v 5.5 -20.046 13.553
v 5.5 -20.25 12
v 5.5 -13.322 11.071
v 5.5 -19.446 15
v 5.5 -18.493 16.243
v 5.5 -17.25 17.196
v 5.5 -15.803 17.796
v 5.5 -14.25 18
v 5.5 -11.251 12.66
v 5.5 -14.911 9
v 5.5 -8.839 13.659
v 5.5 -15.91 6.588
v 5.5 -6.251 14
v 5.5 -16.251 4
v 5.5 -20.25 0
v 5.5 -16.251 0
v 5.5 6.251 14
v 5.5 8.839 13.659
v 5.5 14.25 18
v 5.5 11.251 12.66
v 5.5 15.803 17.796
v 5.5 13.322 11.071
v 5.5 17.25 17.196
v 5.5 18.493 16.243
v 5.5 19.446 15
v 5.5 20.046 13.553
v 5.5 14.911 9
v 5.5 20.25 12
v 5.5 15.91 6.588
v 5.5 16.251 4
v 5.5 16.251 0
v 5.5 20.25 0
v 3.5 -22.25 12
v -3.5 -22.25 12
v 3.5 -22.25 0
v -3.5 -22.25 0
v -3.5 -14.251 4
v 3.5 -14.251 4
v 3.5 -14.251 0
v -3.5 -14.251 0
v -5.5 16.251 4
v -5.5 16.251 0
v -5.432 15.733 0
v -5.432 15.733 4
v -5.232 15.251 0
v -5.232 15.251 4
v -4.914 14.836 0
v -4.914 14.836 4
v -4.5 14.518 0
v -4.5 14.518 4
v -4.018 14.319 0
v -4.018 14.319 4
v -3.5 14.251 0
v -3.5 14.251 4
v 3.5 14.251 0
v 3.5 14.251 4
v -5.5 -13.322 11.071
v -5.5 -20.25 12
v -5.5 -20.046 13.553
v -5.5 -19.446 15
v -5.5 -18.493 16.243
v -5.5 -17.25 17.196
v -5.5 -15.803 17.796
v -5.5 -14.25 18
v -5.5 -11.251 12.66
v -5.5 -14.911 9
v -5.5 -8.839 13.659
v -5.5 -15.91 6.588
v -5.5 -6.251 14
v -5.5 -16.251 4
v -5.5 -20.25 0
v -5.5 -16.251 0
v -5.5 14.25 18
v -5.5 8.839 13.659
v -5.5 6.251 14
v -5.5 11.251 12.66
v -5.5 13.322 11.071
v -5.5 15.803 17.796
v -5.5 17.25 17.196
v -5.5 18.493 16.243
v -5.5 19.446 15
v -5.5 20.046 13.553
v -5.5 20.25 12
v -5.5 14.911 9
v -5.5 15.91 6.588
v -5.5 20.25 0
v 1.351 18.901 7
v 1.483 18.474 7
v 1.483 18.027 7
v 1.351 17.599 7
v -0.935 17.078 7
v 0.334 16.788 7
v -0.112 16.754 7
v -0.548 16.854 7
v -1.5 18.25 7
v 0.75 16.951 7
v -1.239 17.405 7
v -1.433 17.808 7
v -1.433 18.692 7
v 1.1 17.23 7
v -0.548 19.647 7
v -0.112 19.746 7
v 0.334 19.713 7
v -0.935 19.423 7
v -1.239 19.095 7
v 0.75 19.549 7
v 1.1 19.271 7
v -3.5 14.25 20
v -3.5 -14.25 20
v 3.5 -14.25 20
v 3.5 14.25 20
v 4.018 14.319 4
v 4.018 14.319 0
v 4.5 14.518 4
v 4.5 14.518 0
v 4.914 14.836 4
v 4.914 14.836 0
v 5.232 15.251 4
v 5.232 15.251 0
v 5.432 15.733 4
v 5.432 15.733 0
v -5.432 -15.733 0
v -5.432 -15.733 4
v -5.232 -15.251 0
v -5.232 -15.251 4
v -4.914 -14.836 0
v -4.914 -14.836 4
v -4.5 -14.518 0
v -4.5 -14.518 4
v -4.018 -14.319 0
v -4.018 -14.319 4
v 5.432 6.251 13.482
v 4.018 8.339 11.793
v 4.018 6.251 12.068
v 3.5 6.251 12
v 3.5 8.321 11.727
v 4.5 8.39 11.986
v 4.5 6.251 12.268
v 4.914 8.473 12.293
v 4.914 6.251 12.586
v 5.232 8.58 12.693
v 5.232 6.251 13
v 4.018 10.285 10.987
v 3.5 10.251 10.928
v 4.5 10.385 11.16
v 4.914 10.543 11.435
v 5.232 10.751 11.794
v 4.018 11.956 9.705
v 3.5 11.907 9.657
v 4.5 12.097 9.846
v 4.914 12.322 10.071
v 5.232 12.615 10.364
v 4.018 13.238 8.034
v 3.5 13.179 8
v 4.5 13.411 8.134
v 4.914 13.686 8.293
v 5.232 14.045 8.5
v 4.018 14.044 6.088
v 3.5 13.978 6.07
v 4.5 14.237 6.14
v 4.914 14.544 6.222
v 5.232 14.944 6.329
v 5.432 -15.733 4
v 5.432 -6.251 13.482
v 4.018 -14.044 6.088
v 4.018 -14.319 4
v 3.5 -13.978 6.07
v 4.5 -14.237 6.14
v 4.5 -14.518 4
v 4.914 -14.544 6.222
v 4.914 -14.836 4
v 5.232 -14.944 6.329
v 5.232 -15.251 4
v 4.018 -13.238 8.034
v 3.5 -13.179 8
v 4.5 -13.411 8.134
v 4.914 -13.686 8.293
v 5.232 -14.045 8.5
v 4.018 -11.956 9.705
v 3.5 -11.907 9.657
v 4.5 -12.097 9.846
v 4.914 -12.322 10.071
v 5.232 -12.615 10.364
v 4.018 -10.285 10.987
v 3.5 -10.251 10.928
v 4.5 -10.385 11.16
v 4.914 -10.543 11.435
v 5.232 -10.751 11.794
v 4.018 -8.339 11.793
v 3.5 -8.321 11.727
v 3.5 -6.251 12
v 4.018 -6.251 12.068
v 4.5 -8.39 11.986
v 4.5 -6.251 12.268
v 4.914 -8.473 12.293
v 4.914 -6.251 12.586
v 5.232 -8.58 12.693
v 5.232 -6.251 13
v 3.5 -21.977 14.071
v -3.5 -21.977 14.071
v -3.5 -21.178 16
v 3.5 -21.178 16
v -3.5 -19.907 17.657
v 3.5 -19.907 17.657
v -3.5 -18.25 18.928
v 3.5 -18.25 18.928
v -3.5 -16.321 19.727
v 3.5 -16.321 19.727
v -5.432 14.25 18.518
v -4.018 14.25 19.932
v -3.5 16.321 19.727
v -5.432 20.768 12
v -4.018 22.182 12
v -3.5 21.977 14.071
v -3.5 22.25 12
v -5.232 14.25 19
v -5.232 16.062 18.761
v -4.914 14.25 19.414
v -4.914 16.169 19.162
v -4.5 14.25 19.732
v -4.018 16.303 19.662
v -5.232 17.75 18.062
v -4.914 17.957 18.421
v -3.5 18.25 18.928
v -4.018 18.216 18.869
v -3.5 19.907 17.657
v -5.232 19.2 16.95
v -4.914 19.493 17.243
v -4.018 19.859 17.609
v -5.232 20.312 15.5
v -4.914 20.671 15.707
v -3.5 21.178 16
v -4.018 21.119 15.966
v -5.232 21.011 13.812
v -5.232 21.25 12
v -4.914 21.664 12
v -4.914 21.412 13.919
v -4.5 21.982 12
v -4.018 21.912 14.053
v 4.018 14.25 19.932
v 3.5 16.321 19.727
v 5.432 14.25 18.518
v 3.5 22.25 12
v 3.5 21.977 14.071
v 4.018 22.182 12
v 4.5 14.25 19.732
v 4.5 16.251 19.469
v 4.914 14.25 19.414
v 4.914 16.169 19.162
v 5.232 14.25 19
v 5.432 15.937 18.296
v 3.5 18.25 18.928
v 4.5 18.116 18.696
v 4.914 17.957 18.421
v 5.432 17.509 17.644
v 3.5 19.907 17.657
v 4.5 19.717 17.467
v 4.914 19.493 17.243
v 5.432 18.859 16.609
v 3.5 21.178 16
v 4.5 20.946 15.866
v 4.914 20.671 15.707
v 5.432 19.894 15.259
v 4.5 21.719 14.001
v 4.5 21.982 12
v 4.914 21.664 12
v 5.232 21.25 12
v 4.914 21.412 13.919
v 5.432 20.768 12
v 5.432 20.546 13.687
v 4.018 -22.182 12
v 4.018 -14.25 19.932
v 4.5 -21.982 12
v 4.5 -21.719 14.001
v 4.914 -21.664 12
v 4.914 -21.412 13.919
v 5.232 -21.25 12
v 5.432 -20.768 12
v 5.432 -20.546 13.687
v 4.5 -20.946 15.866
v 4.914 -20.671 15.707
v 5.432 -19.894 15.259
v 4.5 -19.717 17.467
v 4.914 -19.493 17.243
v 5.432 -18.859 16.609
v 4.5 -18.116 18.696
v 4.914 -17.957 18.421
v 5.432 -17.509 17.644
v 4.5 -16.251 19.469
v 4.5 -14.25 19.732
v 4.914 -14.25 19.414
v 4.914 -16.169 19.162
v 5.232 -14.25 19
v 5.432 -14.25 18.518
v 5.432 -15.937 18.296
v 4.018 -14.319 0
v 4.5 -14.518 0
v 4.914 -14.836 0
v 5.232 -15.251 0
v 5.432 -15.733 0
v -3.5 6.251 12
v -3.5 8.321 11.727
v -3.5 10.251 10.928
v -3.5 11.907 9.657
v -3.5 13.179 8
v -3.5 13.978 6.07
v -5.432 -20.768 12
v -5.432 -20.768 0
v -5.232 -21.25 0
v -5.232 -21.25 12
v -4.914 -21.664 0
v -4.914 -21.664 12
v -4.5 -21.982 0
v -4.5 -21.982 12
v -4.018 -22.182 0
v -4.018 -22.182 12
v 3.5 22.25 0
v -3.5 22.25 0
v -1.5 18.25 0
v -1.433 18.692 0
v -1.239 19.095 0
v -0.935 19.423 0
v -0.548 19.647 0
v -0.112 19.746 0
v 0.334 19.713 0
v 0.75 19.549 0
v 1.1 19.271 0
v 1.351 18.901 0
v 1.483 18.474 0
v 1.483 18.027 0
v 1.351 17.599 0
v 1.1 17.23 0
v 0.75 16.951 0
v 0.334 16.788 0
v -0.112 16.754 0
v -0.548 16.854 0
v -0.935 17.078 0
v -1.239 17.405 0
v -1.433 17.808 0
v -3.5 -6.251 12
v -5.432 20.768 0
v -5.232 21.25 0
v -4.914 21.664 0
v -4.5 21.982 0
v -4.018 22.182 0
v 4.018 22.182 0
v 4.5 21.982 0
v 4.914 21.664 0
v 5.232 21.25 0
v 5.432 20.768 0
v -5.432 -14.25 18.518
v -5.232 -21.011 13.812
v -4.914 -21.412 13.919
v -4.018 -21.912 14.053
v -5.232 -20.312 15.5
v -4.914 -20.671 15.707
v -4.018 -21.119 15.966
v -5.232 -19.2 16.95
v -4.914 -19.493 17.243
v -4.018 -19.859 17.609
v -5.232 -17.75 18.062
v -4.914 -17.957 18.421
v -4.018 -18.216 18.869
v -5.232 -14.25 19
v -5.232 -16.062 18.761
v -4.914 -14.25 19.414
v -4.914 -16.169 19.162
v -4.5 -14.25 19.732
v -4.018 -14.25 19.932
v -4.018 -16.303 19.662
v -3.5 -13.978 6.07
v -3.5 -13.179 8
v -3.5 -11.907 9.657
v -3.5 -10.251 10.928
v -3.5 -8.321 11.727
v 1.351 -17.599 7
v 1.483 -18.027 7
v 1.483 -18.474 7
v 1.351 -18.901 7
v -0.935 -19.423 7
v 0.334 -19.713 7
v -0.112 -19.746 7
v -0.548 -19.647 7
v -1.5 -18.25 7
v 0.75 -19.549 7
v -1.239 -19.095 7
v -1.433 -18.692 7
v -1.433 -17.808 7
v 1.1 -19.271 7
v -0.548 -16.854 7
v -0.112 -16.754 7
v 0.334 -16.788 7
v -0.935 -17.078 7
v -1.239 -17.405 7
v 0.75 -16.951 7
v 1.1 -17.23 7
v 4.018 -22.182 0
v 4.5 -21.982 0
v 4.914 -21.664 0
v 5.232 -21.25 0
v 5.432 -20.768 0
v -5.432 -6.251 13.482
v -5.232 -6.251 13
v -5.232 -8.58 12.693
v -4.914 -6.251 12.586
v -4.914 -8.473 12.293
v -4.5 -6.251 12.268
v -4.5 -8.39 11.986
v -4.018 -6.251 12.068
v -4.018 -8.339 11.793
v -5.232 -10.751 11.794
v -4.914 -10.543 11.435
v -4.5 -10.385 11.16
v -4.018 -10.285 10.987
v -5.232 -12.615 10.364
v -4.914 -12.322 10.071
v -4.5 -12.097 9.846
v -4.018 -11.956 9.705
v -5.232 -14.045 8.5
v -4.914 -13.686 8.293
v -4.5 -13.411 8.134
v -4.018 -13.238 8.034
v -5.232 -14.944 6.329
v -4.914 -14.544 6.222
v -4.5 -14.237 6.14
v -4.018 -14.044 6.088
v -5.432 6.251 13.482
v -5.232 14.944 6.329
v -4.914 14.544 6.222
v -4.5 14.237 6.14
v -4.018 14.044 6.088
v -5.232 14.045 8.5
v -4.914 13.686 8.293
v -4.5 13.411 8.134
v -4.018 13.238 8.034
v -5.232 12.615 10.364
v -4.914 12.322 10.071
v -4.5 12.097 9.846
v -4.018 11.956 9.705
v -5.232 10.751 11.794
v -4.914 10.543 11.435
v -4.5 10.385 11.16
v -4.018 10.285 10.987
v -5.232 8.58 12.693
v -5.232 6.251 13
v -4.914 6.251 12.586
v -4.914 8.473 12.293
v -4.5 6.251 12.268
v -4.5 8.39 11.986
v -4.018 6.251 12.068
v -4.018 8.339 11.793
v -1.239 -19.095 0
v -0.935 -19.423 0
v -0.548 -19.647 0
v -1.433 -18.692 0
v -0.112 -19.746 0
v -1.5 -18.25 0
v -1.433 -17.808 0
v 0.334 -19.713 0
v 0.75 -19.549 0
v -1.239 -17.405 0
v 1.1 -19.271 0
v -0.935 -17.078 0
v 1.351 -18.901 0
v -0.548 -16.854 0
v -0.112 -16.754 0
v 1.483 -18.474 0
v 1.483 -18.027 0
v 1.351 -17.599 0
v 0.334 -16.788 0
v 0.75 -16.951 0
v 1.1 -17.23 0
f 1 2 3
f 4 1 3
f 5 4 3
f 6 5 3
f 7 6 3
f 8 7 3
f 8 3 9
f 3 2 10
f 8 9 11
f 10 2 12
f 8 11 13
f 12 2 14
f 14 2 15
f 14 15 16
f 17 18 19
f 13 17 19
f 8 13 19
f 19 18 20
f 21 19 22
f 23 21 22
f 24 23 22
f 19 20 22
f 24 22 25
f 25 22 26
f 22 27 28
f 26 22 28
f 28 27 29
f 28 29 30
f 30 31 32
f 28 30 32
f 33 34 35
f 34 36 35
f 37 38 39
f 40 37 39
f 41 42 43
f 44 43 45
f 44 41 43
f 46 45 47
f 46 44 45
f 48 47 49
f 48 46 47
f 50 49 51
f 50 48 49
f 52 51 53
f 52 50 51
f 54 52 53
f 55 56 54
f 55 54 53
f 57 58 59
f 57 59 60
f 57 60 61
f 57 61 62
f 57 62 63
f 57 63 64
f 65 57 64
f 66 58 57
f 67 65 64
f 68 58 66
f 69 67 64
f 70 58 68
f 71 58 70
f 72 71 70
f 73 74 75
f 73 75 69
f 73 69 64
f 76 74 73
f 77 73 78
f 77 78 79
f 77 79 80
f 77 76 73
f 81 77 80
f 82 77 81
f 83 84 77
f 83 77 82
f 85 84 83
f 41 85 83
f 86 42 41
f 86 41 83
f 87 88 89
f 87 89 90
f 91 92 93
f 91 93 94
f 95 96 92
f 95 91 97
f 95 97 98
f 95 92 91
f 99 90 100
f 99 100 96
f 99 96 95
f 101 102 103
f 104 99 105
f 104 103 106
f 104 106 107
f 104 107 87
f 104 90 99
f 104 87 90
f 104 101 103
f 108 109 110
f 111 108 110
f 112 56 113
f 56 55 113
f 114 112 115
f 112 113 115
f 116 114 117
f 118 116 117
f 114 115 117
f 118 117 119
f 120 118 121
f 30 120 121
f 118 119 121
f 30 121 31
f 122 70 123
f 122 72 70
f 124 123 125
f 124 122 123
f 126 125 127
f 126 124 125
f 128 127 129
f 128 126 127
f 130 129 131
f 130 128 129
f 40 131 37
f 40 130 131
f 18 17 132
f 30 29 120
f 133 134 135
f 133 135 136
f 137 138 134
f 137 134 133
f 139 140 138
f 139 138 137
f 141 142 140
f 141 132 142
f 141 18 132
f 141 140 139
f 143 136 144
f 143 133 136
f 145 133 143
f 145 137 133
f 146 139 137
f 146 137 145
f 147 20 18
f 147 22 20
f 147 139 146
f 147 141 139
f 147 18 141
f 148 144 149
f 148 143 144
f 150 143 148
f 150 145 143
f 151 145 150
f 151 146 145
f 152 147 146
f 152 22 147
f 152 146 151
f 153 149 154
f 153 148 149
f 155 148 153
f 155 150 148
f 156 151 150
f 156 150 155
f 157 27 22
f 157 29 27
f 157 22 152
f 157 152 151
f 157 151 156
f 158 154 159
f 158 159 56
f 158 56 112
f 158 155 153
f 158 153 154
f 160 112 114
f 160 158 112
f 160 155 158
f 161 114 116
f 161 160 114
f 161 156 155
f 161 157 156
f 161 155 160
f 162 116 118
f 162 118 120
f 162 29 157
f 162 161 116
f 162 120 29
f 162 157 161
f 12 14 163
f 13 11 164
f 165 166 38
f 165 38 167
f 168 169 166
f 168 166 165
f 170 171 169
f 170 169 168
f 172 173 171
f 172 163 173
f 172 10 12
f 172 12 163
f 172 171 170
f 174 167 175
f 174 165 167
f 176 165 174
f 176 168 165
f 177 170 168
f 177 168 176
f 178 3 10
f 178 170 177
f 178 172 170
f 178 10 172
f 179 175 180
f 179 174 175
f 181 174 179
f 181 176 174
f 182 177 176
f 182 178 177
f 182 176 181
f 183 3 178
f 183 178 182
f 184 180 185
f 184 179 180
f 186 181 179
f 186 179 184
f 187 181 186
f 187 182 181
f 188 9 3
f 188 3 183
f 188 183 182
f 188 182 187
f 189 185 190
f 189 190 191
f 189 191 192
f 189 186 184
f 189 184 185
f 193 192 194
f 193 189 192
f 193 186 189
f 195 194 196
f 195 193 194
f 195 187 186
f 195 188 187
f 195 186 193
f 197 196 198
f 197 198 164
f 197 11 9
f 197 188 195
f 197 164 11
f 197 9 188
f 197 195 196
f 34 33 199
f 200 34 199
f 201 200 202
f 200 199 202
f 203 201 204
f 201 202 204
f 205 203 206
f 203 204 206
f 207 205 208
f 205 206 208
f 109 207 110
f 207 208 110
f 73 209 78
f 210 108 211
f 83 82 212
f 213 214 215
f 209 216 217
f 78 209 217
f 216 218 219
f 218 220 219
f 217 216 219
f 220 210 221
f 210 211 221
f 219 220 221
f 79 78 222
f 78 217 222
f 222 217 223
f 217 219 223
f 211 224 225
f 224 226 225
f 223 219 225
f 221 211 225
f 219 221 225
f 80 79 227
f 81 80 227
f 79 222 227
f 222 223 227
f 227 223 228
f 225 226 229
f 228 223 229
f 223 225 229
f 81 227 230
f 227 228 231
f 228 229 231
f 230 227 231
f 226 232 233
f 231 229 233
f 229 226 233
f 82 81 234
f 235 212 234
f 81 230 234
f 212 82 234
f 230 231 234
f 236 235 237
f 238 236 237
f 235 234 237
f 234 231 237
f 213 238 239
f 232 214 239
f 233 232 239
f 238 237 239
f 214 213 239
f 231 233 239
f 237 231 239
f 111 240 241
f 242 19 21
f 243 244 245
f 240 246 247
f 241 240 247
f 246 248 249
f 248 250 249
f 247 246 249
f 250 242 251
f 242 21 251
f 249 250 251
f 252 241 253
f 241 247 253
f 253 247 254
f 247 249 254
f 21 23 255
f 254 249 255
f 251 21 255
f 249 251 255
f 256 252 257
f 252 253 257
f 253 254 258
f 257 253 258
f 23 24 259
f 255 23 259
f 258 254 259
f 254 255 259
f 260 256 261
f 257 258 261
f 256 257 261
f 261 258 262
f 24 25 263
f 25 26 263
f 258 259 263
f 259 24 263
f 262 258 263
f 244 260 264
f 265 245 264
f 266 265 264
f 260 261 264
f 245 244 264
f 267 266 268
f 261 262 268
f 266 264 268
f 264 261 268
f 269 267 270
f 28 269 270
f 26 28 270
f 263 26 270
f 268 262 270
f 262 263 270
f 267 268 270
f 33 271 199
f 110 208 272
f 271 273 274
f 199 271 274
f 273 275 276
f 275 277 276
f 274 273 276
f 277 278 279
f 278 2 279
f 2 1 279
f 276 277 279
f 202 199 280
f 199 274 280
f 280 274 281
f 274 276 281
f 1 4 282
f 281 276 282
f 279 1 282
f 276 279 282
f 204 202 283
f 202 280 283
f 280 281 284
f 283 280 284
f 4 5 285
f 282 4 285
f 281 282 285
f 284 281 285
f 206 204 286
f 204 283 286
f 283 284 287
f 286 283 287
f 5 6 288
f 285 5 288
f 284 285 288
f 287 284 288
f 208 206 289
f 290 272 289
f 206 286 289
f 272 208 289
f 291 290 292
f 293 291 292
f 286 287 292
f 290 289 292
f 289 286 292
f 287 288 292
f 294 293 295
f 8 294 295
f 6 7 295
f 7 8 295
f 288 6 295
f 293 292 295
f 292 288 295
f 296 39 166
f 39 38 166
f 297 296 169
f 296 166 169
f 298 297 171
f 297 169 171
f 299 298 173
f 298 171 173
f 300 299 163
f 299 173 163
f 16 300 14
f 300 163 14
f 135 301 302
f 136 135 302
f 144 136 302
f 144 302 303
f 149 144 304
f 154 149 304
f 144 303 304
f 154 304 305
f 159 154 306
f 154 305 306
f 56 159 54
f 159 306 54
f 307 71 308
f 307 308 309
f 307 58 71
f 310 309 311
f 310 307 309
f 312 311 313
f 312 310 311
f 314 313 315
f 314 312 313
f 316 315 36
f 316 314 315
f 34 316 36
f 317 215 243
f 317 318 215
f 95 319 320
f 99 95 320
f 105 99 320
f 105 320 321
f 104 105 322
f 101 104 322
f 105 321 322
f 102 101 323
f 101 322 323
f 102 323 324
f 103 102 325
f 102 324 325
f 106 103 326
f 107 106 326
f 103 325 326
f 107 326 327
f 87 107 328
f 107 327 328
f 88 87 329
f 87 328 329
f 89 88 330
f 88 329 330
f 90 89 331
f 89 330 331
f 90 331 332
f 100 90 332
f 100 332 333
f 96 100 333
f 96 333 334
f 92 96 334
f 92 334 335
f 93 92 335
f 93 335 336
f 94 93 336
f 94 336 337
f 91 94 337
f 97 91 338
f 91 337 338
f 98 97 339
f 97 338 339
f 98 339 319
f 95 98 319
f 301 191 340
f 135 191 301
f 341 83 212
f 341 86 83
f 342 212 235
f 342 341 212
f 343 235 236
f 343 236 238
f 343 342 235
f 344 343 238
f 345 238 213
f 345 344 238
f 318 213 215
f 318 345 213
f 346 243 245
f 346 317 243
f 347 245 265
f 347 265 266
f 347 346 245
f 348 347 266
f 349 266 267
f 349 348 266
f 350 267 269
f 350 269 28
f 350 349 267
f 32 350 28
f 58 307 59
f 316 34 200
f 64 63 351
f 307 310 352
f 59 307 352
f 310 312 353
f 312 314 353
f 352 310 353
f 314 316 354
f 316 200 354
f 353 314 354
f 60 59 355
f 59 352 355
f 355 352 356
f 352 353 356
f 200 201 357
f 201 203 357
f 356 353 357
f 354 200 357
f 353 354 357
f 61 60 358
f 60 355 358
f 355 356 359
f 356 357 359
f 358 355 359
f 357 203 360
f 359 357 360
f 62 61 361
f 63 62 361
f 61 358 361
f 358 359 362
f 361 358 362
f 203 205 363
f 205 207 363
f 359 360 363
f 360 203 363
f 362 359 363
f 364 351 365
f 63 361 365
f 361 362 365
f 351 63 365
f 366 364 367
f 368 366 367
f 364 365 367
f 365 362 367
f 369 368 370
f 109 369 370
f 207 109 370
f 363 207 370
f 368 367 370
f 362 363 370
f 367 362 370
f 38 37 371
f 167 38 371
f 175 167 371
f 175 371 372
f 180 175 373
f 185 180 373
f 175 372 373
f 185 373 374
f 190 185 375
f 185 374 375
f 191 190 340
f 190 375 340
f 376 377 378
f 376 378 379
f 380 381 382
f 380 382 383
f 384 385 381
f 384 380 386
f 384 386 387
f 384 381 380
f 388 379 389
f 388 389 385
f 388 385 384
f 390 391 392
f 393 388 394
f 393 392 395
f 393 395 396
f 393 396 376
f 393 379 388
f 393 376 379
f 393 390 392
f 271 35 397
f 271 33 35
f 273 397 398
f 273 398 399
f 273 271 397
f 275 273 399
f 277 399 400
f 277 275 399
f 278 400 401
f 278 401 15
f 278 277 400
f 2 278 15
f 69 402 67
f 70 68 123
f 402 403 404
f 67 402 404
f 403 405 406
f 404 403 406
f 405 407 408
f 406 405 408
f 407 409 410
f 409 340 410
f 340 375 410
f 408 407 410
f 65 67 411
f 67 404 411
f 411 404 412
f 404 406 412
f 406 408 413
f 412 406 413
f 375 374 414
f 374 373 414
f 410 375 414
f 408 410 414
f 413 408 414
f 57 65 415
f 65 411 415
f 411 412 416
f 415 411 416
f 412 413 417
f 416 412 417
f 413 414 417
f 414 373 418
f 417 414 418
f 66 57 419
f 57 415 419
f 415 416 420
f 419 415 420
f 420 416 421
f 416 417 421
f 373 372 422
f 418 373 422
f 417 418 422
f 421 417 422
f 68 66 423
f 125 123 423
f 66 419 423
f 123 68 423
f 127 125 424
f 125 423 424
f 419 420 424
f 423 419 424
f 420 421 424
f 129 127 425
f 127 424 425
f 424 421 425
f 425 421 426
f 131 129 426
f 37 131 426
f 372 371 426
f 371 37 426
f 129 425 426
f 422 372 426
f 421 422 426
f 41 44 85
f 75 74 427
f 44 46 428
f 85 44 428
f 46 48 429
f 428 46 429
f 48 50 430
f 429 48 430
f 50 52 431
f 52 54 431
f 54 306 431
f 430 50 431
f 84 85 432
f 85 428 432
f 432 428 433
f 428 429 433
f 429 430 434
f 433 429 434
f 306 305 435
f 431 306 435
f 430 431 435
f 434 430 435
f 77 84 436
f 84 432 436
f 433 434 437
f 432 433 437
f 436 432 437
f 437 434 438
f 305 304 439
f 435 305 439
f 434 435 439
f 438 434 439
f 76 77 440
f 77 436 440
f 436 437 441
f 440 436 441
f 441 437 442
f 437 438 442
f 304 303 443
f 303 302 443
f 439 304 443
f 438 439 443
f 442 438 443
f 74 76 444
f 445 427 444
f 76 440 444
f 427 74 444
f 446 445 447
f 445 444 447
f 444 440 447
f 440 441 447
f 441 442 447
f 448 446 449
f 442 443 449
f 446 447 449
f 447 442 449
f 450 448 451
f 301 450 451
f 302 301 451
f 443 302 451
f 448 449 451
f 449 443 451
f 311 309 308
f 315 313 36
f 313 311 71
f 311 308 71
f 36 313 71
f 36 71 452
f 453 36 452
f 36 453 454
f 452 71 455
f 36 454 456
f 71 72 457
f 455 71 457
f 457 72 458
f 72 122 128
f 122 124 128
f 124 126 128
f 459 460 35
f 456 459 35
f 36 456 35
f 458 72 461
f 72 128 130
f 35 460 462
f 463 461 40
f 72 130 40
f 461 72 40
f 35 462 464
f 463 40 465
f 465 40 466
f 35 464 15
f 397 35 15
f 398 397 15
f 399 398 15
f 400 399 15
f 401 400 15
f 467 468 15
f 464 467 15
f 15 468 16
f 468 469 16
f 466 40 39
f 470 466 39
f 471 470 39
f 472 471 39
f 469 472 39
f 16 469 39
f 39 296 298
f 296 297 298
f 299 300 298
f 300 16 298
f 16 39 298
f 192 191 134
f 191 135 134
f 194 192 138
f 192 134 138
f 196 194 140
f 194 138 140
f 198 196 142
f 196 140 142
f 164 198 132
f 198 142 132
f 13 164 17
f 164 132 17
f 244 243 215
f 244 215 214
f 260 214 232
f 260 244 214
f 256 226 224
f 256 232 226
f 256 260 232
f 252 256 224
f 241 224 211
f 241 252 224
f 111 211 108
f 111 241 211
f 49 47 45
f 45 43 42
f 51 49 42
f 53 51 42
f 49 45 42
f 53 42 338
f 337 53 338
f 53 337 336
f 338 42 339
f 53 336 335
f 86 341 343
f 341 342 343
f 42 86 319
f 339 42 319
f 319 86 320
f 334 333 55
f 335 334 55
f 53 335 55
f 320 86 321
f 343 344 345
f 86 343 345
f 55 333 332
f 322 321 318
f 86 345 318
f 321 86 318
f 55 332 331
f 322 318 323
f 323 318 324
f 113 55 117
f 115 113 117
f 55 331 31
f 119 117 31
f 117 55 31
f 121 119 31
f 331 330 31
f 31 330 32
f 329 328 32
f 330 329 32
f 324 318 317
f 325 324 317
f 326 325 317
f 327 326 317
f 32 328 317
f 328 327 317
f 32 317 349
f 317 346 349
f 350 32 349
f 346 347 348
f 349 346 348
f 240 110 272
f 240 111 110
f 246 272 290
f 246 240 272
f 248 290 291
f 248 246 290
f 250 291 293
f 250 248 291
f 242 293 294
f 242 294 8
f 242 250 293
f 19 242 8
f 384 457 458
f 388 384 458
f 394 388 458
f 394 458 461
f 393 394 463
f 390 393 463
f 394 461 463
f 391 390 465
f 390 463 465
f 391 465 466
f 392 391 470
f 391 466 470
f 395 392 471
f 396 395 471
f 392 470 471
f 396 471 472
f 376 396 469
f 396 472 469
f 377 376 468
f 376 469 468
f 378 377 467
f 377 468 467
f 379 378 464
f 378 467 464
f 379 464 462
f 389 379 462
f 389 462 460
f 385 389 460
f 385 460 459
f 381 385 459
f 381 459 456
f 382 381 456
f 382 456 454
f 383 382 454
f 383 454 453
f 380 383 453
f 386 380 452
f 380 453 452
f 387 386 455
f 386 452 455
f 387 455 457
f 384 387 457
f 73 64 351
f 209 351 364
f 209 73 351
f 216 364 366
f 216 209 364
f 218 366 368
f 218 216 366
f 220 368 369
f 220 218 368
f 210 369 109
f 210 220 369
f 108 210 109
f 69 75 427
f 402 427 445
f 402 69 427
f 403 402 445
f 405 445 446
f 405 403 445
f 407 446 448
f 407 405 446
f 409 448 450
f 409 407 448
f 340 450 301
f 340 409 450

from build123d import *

# Parameters (mm, degrees)
ESQUISSE1_W             = 11
ESQUISSE1_H             = 44.5
BOSS_EXTRU_1_DEPTH      = 20
CONG_1_R                = 8
ESQUISSE2_W             = 11.999855804
ESQUISSE2_H             = 28.501098838
ENL_V_MAT_EXTRU_1_DEPTH = 20
CONG_2_R                = 8
ESQUISSE3_R             = 1.5
ENL_V_MAT_EXTRU_2_DEPTH = 7
CONG_3_R                = 2


with BuildPart() as part:
    # Esquisse1 → Boss.-Extru.1 (new body)
    with BuildSketch(Plane.XY):
        Rectangle(ESQUISSE1_W, ESQUISSE1_H)
    extrude(amount=BOSS_EXTRU_1_DEPTH)

    # Congé1
    cong_1_edges = [part.edges().sort_by_distance(p)[0] for p in [
        (0, -22.25, 20),
        (0, 22.25, 20),
    ]]
    fillet(cong_1_edges, radius=CONG_1_R)

    # Esquisse2 → Enlèv. mat.-Extru.1 (cut)
    with BuildSketch(Plane(origin=(5.5, 0, 0), x_dir=(0, 0, -1), z_dir=(1, 0, 0))):
        with Locations((-5.999927902, 0)):
            Rectangle(ESQUISSE2_W, ESQUISSE2_H)
    extrude(amount=-ENL_V_MAT_EXTRU_1_DEPTH, mode=Mode.SUBTRACT)

    # Congé2
    cong_2_edges = [part.edges().sort_by_distance(p)[0] for p in [
        (0, -14.250549419, 11.999855804),
        (0, 14.250549419, 11.999855804),
    ]]
    fillet(cong_2_edges, radius=CONG_2_R)

    # Esquisse3 → Enlèv. mat.-Extru.2 (cut)
    with BuildSketch(Plane(origin=(0, 0, 0), x_dir=(-1, 0, 0), z_dir=(0, 0, -1))):
        with Locations((0, 18.25027471)):
            Circle(ESQUISSE3_R)
        with Locations((0, -18.25027471)):
            Circle(ESQUISSE3_R)
    extrude(amount=-ENL_V_MAT_EXTRU_2_DEPTH, mode=Mode.SUBTRACT)

    # Congé3
    cong_3_edges = [part.edges().sort_by_distance(p)[0] for p in [
        (5.5, 0, 20),
        (-5.5, 0, 20),
        (5.5, 22.25, 6),
        (5.5, -22.25, 6),
        (5.5, 19.906854249, 17.656854249),
        (5.5, -19.906854249, 17.656854249),
        (-5.5, -22.25, 6),
        (-5.5, 22.25, 6),
        (-5.5, 19.906854249, 17.656854249),
        (-5.5, -19.906854249, 17.656854249),
        (-5.5, 14.250549419, 1.999927902),
        (5.5, 14.250549419, 1.999927902),
        (5.5, -14.250549419, 1.999927902),
        (-5.5, -14.250549419, 1.999927902),
        (5.5, 0, 11.999855804),
        (-5.5, 0, 11.999855804),
        (5.5, -11.907403669, 9.656710053),
        (-5.5, -11.907403669, 9.656710053),
        (5.5, 11.907403669, 9.656710053),
        (-5.5, 11.907403669, 9.656710053),
    ]]
    fillet(cong_3_edges, radius=CONG_3_R)


solid = part.part
